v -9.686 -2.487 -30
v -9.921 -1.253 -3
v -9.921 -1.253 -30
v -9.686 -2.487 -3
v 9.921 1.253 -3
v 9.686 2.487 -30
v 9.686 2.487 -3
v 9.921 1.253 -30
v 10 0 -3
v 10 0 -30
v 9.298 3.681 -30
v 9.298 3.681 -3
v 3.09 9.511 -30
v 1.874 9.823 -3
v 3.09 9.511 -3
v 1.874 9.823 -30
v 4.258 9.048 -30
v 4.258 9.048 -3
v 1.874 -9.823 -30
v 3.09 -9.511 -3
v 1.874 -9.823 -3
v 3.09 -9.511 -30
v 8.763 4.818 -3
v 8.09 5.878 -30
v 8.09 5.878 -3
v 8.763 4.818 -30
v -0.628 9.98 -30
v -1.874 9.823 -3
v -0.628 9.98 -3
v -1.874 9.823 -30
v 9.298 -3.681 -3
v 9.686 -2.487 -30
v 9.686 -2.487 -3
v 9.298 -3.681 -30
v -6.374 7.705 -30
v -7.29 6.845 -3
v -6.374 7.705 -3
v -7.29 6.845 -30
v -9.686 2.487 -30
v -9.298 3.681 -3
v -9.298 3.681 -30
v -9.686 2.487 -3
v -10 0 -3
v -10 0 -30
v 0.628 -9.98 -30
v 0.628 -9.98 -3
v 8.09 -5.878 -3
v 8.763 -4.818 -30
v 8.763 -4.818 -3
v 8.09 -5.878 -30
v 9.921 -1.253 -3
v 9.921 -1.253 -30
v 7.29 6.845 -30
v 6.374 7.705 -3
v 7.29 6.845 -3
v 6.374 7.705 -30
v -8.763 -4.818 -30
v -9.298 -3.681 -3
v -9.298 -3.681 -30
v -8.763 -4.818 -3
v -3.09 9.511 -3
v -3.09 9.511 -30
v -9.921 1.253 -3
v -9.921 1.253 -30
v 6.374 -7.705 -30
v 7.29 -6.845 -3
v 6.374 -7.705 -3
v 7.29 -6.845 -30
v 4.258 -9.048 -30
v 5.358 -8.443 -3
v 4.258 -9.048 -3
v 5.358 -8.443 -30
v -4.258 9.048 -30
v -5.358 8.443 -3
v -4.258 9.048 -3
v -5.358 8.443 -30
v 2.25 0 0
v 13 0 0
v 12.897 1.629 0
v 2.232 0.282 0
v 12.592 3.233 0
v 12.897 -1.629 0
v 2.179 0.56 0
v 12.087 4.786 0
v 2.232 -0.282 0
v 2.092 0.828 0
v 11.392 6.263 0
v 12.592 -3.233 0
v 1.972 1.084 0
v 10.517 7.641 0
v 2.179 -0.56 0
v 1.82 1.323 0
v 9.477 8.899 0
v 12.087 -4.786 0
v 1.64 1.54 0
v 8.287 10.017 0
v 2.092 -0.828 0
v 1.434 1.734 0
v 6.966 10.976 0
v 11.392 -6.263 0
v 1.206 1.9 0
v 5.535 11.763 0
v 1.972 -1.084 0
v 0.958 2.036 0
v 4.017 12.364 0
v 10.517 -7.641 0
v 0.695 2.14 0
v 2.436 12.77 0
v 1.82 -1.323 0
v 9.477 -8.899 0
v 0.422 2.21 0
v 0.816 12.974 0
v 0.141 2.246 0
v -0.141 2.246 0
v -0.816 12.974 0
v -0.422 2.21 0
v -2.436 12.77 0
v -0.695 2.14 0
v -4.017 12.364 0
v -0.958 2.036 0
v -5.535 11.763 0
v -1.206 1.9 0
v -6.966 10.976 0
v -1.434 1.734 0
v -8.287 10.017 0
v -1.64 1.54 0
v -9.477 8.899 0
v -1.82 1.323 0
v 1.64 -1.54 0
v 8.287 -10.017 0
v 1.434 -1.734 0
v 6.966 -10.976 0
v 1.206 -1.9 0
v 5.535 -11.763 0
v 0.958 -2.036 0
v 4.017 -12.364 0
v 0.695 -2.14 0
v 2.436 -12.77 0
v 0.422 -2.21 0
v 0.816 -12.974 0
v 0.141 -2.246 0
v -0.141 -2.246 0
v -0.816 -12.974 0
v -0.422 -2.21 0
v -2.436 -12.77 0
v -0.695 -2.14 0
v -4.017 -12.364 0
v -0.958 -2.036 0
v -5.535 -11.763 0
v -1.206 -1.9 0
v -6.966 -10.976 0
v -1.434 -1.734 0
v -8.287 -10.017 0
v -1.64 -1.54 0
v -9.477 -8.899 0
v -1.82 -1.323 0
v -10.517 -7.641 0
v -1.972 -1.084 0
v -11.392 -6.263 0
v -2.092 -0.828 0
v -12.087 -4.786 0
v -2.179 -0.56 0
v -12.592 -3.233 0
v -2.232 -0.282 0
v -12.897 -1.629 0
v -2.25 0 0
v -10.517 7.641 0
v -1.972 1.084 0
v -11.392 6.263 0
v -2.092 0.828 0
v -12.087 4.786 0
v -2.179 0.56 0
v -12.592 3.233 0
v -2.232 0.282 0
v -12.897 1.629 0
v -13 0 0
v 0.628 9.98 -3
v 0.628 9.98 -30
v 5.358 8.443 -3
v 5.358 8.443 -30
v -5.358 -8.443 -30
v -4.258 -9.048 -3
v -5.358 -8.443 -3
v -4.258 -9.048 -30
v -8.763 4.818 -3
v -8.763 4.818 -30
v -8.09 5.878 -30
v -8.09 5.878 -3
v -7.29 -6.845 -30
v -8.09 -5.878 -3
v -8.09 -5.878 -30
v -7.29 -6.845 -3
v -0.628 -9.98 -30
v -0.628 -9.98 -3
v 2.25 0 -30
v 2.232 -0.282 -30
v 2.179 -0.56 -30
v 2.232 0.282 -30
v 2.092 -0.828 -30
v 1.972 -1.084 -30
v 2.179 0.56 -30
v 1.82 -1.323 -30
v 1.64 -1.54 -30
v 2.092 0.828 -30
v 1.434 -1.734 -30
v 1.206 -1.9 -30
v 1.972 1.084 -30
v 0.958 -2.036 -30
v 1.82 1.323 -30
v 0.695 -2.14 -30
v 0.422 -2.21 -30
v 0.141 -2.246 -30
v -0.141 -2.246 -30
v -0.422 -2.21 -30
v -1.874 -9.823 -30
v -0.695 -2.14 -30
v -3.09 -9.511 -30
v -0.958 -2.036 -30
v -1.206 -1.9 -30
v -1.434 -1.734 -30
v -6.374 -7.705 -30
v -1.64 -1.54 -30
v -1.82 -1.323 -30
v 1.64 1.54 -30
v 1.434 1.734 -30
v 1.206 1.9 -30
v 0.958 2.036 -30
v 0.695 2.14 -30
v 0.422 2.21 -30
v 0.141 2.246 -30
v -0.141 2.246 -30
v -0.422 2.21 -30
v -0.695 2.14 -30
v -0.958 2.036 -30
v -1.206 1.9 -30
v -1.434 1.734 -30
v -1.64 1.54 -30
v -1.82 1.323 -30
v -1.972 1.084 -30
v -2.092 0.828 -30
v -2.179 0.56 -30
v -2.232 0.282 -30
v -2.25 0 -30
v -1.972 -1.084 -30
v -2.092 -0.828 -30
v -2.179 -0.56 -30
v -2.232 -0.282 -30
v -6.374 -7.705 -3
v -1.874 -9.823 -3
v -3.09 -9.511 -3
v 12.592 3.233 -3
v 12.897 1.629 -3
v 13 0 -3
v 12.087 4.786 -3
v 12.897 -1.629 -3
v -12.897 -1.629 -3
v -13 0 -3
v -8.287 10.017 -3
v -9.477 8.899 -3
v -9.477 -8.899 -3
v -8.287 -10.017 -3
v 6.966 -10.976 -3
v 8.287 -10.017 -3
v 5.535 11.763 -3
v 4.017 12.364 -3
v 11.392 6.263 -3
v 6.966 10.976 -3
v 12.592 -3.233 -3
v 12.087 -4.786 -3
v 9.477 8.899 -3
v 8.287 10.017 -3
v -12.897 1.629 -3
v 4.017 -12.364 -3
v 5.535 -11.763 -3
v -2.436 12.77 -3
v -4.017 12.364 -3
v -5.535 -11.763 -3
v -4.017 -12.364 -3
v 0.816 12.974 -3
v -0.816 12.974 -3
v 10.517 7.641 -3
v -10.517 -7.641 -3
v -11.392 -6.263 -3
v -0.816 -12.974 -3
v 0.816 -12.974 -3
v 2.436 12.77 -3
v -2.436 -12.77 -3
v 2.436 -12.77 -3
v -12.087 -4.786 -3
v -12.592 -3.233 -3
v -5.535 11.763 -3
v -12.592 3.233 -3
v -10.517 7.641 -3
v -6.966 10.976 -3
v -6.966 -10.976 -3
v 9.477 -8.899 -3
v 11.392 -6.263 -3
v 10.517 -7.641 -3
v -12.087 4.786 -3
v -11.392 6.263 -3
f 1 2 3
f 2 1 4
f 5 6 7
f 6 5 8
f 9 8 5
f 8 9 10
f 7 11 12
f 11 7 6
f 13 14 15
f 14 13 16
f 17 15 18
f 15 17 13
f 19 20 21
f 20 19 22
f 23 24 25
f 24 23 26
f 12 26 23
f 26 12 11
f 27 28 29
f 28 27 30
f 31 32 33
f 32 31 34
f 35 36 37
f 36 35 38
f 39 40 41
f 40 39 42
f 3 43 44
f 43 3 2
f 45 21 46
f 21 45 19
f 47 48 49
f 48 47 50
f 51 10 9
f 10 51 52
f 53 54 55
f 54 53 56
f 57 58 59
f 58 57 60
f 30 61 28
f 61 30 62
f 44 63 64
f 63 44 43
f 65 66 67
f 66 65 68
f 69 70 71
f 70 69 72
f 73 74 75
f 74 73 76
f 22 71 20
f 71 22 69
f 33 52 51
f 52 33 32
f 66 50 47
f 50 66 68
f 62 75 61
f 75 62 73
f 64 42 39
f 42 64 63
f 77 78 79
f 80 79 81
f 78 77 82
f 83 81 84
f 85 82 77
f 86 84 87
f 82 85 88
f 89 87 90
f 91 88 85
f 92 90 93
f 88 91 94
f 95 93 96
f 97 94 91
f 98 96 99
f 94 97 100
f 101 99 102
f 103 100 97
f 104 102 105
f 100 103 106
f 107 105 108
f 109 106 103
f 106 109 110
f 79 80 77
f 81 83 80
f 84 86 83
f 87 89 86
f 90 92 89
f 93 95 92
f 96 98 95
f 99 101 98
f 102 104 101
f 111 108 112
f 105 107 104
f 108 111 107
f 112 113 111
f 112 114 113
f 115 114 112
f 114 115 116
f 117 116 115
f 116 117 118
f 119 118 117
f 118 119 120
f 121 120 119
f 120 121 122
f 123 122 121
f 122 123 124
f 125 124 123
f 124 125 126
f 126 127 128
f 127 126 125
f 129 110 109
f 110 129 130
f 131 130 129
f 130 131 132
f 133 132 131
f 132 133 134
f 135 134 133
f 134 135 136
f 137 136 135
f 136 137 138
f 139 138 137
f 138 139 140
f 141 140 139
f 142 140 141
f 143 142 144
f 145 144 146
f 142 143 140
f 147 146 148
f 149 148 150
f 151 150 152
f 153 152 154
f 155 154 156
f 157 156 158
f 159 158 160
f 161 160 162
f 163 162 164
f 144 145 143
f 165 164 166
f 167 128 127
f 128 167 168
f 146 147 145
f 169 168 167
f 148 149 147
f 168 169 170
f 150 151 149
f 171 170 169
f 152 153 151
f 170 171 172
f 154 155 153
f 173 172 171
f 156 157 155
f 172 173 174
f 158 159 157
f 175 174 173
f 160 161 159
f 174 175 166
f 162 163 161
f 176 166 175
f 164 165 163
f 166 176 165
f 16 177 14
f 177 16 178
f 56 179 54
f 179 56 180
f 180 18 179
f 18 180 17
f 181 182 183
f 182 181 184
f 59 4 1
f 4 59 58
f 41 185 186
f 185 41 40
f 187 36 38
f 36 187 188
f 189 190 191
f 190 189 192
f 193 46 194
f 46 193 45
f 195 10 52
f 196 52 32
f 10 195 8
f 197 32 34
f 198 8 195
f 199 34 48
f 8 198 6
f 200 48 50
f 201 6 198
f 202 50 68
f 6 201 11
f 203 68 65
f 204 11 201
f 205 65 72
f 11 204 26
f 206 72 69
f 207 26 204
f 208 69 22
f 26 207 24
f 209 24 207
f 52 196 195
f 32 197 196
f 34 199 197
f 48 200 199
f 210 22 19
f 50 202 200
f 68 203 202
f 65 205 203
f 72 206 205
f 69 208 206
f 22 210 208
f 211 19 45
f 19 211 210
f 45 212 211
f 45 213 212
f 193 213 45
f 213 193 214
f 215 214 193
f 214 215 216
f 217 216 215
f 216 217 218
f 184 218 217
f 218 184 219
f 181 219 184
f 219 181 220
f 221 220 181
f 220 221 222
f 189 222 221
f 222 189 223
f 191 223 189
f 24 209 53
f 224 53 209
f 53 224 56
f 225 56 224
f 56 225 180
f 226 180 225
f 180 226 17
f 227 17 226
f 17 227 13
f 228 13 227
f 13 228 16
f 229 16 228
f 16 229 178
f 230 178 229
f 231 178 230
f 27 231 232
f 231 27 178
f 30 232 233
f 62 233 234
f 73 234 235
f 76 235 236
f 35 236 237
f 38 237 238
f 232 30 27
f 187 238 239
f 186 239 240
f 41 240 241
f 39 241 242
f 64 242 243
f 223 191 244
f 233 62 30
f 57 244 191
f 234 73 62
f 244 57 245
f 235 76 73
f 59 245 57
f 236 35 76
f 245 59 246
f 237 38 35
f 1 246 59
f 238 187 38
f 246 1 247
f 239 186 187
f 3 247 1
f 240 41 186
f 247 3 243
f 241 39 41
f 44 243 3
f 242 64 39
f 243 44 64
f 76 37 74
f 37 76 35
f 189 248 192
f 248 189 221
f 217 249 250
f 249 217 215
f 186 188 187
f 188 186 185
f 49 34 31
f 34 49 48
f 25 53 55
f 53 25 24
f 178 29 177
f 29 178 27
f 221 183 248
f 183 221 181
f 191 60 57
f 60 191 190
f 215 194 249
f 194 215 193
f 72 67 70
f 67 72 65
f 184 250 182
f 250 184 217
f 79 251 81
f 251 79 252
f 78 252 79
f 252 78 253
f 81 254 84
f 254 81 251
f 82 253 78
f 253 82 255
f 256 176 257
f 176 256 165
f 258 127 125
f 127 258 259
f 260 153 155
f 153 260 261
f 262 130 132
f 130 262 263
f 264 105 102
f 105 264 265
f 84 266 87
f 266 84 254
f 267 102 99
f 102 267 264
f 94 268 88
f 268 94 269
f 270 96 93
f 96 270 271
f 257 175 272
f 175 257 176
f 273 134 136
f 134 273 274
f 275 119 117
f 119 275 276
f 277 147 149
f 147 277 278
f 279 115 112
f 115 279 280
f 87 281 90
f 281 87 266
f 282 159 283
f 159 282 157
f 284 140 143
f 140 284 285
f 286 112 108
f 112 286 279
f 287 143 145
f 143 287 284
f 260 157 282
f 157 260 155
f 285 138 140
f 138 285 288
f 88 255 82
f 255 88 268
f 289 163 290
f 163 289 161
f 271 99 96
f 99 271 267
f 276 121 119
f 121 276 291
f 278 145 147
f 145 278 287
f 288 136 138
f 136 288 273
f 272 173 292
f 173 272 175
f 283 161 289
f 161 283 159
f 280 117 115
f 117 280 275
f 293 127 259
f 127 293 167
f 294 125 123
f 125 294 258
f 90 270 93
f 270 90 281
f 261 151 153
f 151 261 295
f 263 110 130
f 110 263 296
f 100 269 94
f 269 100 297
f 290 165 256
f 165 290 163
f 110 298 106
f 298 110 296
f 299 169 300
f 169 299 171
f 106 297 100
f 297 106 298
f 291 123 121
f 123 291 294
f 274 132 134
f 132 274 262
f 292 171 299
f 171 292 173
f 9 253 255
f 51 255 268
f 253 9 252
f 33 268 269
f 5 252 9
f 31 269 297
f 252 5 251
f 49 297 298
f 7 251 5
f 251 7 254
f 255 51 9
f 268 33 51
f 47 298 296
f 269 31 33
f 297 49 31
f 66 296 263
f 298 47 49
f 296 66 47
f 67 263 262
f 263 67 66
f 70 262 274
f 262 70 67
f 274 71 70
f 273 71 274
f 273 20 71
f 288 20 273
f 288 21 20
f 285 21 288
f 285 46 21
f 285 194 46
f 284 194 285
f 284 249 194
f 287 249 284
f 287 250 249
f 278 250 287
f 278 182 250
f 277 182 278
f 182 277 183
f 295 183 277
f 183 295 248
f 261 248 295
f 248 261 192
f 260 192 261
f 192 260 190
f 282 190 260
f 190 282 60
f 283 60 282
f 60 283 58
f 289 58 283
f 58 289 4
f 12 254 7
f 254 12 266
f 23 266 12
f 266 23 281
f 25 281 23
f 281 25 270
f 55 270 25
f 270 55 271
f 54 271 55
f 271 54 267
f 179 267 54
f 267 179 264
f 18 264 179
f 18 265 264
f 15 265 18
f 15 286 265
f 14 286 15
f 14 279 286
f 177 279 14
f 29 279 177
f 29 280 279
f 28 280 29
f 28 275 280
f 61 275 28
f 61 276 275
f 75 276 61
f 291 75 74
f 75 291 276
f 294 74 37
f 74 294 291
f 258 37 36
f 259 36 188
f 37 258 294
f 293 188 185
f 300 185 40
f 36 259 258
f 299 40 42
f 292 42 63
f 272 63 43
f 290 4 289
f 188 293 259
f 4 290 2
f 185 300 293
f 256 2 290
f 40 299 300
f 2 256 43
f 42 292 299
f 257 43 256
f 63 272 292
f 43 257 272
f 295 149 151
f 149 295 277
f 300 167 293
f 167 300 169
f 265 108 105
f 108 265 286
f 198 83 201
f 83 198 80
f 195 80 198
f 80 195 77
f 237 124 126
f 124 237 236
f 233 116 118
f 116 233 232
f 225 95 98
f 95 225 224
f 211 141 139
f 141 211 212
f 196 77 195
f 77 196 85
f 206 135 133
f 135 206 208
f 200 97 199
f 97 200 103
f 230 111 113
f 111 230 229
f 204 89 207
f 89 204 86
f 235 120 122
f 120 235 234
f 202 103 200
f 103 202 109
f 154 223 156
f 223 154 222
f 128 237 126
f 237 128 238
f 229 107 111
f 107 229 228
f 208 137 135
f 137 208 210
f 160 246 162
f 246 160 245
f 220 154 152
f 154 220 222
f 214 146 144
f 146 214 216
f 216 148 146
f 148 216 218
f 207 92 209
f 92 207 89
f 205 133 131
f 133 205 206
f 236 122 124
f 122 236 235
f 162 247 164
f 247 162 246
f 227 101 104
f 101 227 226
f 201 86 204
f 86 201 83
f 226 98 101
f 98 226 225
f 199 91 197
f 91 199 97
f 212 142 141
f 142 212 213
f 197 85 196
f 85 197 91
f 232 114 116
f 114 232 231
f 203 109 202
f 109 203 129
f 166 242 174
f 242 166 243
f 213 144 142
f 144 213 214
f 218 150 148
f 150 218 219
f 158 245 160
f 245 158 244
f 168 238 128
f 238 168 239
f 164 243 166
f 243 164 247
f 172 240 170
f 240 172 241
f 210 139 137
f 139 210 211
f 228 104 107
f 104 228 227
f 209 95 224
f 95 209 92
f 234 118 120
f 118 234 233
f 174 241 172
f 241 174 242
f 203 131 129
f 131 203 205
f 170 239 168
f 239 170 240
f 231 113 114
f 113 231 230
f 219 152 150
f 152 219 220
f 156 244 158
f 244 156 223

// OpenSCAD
$fn = 50;


difference() {
	union() {
		translate(v = [0, 0, -30.0000000000]) {
			cylinder(h = 30, r = 10.0000000000);
		}
		translate(v = [0, 0, -3.0000000000]) {
			cylinder(h = 3, r = 13.0000000000);
		}
	}
	union() {
		#translate(v = [0, 0, -30]) {
			cylinder(h = 30, r = 2.2500000000);
		}
	}
}
